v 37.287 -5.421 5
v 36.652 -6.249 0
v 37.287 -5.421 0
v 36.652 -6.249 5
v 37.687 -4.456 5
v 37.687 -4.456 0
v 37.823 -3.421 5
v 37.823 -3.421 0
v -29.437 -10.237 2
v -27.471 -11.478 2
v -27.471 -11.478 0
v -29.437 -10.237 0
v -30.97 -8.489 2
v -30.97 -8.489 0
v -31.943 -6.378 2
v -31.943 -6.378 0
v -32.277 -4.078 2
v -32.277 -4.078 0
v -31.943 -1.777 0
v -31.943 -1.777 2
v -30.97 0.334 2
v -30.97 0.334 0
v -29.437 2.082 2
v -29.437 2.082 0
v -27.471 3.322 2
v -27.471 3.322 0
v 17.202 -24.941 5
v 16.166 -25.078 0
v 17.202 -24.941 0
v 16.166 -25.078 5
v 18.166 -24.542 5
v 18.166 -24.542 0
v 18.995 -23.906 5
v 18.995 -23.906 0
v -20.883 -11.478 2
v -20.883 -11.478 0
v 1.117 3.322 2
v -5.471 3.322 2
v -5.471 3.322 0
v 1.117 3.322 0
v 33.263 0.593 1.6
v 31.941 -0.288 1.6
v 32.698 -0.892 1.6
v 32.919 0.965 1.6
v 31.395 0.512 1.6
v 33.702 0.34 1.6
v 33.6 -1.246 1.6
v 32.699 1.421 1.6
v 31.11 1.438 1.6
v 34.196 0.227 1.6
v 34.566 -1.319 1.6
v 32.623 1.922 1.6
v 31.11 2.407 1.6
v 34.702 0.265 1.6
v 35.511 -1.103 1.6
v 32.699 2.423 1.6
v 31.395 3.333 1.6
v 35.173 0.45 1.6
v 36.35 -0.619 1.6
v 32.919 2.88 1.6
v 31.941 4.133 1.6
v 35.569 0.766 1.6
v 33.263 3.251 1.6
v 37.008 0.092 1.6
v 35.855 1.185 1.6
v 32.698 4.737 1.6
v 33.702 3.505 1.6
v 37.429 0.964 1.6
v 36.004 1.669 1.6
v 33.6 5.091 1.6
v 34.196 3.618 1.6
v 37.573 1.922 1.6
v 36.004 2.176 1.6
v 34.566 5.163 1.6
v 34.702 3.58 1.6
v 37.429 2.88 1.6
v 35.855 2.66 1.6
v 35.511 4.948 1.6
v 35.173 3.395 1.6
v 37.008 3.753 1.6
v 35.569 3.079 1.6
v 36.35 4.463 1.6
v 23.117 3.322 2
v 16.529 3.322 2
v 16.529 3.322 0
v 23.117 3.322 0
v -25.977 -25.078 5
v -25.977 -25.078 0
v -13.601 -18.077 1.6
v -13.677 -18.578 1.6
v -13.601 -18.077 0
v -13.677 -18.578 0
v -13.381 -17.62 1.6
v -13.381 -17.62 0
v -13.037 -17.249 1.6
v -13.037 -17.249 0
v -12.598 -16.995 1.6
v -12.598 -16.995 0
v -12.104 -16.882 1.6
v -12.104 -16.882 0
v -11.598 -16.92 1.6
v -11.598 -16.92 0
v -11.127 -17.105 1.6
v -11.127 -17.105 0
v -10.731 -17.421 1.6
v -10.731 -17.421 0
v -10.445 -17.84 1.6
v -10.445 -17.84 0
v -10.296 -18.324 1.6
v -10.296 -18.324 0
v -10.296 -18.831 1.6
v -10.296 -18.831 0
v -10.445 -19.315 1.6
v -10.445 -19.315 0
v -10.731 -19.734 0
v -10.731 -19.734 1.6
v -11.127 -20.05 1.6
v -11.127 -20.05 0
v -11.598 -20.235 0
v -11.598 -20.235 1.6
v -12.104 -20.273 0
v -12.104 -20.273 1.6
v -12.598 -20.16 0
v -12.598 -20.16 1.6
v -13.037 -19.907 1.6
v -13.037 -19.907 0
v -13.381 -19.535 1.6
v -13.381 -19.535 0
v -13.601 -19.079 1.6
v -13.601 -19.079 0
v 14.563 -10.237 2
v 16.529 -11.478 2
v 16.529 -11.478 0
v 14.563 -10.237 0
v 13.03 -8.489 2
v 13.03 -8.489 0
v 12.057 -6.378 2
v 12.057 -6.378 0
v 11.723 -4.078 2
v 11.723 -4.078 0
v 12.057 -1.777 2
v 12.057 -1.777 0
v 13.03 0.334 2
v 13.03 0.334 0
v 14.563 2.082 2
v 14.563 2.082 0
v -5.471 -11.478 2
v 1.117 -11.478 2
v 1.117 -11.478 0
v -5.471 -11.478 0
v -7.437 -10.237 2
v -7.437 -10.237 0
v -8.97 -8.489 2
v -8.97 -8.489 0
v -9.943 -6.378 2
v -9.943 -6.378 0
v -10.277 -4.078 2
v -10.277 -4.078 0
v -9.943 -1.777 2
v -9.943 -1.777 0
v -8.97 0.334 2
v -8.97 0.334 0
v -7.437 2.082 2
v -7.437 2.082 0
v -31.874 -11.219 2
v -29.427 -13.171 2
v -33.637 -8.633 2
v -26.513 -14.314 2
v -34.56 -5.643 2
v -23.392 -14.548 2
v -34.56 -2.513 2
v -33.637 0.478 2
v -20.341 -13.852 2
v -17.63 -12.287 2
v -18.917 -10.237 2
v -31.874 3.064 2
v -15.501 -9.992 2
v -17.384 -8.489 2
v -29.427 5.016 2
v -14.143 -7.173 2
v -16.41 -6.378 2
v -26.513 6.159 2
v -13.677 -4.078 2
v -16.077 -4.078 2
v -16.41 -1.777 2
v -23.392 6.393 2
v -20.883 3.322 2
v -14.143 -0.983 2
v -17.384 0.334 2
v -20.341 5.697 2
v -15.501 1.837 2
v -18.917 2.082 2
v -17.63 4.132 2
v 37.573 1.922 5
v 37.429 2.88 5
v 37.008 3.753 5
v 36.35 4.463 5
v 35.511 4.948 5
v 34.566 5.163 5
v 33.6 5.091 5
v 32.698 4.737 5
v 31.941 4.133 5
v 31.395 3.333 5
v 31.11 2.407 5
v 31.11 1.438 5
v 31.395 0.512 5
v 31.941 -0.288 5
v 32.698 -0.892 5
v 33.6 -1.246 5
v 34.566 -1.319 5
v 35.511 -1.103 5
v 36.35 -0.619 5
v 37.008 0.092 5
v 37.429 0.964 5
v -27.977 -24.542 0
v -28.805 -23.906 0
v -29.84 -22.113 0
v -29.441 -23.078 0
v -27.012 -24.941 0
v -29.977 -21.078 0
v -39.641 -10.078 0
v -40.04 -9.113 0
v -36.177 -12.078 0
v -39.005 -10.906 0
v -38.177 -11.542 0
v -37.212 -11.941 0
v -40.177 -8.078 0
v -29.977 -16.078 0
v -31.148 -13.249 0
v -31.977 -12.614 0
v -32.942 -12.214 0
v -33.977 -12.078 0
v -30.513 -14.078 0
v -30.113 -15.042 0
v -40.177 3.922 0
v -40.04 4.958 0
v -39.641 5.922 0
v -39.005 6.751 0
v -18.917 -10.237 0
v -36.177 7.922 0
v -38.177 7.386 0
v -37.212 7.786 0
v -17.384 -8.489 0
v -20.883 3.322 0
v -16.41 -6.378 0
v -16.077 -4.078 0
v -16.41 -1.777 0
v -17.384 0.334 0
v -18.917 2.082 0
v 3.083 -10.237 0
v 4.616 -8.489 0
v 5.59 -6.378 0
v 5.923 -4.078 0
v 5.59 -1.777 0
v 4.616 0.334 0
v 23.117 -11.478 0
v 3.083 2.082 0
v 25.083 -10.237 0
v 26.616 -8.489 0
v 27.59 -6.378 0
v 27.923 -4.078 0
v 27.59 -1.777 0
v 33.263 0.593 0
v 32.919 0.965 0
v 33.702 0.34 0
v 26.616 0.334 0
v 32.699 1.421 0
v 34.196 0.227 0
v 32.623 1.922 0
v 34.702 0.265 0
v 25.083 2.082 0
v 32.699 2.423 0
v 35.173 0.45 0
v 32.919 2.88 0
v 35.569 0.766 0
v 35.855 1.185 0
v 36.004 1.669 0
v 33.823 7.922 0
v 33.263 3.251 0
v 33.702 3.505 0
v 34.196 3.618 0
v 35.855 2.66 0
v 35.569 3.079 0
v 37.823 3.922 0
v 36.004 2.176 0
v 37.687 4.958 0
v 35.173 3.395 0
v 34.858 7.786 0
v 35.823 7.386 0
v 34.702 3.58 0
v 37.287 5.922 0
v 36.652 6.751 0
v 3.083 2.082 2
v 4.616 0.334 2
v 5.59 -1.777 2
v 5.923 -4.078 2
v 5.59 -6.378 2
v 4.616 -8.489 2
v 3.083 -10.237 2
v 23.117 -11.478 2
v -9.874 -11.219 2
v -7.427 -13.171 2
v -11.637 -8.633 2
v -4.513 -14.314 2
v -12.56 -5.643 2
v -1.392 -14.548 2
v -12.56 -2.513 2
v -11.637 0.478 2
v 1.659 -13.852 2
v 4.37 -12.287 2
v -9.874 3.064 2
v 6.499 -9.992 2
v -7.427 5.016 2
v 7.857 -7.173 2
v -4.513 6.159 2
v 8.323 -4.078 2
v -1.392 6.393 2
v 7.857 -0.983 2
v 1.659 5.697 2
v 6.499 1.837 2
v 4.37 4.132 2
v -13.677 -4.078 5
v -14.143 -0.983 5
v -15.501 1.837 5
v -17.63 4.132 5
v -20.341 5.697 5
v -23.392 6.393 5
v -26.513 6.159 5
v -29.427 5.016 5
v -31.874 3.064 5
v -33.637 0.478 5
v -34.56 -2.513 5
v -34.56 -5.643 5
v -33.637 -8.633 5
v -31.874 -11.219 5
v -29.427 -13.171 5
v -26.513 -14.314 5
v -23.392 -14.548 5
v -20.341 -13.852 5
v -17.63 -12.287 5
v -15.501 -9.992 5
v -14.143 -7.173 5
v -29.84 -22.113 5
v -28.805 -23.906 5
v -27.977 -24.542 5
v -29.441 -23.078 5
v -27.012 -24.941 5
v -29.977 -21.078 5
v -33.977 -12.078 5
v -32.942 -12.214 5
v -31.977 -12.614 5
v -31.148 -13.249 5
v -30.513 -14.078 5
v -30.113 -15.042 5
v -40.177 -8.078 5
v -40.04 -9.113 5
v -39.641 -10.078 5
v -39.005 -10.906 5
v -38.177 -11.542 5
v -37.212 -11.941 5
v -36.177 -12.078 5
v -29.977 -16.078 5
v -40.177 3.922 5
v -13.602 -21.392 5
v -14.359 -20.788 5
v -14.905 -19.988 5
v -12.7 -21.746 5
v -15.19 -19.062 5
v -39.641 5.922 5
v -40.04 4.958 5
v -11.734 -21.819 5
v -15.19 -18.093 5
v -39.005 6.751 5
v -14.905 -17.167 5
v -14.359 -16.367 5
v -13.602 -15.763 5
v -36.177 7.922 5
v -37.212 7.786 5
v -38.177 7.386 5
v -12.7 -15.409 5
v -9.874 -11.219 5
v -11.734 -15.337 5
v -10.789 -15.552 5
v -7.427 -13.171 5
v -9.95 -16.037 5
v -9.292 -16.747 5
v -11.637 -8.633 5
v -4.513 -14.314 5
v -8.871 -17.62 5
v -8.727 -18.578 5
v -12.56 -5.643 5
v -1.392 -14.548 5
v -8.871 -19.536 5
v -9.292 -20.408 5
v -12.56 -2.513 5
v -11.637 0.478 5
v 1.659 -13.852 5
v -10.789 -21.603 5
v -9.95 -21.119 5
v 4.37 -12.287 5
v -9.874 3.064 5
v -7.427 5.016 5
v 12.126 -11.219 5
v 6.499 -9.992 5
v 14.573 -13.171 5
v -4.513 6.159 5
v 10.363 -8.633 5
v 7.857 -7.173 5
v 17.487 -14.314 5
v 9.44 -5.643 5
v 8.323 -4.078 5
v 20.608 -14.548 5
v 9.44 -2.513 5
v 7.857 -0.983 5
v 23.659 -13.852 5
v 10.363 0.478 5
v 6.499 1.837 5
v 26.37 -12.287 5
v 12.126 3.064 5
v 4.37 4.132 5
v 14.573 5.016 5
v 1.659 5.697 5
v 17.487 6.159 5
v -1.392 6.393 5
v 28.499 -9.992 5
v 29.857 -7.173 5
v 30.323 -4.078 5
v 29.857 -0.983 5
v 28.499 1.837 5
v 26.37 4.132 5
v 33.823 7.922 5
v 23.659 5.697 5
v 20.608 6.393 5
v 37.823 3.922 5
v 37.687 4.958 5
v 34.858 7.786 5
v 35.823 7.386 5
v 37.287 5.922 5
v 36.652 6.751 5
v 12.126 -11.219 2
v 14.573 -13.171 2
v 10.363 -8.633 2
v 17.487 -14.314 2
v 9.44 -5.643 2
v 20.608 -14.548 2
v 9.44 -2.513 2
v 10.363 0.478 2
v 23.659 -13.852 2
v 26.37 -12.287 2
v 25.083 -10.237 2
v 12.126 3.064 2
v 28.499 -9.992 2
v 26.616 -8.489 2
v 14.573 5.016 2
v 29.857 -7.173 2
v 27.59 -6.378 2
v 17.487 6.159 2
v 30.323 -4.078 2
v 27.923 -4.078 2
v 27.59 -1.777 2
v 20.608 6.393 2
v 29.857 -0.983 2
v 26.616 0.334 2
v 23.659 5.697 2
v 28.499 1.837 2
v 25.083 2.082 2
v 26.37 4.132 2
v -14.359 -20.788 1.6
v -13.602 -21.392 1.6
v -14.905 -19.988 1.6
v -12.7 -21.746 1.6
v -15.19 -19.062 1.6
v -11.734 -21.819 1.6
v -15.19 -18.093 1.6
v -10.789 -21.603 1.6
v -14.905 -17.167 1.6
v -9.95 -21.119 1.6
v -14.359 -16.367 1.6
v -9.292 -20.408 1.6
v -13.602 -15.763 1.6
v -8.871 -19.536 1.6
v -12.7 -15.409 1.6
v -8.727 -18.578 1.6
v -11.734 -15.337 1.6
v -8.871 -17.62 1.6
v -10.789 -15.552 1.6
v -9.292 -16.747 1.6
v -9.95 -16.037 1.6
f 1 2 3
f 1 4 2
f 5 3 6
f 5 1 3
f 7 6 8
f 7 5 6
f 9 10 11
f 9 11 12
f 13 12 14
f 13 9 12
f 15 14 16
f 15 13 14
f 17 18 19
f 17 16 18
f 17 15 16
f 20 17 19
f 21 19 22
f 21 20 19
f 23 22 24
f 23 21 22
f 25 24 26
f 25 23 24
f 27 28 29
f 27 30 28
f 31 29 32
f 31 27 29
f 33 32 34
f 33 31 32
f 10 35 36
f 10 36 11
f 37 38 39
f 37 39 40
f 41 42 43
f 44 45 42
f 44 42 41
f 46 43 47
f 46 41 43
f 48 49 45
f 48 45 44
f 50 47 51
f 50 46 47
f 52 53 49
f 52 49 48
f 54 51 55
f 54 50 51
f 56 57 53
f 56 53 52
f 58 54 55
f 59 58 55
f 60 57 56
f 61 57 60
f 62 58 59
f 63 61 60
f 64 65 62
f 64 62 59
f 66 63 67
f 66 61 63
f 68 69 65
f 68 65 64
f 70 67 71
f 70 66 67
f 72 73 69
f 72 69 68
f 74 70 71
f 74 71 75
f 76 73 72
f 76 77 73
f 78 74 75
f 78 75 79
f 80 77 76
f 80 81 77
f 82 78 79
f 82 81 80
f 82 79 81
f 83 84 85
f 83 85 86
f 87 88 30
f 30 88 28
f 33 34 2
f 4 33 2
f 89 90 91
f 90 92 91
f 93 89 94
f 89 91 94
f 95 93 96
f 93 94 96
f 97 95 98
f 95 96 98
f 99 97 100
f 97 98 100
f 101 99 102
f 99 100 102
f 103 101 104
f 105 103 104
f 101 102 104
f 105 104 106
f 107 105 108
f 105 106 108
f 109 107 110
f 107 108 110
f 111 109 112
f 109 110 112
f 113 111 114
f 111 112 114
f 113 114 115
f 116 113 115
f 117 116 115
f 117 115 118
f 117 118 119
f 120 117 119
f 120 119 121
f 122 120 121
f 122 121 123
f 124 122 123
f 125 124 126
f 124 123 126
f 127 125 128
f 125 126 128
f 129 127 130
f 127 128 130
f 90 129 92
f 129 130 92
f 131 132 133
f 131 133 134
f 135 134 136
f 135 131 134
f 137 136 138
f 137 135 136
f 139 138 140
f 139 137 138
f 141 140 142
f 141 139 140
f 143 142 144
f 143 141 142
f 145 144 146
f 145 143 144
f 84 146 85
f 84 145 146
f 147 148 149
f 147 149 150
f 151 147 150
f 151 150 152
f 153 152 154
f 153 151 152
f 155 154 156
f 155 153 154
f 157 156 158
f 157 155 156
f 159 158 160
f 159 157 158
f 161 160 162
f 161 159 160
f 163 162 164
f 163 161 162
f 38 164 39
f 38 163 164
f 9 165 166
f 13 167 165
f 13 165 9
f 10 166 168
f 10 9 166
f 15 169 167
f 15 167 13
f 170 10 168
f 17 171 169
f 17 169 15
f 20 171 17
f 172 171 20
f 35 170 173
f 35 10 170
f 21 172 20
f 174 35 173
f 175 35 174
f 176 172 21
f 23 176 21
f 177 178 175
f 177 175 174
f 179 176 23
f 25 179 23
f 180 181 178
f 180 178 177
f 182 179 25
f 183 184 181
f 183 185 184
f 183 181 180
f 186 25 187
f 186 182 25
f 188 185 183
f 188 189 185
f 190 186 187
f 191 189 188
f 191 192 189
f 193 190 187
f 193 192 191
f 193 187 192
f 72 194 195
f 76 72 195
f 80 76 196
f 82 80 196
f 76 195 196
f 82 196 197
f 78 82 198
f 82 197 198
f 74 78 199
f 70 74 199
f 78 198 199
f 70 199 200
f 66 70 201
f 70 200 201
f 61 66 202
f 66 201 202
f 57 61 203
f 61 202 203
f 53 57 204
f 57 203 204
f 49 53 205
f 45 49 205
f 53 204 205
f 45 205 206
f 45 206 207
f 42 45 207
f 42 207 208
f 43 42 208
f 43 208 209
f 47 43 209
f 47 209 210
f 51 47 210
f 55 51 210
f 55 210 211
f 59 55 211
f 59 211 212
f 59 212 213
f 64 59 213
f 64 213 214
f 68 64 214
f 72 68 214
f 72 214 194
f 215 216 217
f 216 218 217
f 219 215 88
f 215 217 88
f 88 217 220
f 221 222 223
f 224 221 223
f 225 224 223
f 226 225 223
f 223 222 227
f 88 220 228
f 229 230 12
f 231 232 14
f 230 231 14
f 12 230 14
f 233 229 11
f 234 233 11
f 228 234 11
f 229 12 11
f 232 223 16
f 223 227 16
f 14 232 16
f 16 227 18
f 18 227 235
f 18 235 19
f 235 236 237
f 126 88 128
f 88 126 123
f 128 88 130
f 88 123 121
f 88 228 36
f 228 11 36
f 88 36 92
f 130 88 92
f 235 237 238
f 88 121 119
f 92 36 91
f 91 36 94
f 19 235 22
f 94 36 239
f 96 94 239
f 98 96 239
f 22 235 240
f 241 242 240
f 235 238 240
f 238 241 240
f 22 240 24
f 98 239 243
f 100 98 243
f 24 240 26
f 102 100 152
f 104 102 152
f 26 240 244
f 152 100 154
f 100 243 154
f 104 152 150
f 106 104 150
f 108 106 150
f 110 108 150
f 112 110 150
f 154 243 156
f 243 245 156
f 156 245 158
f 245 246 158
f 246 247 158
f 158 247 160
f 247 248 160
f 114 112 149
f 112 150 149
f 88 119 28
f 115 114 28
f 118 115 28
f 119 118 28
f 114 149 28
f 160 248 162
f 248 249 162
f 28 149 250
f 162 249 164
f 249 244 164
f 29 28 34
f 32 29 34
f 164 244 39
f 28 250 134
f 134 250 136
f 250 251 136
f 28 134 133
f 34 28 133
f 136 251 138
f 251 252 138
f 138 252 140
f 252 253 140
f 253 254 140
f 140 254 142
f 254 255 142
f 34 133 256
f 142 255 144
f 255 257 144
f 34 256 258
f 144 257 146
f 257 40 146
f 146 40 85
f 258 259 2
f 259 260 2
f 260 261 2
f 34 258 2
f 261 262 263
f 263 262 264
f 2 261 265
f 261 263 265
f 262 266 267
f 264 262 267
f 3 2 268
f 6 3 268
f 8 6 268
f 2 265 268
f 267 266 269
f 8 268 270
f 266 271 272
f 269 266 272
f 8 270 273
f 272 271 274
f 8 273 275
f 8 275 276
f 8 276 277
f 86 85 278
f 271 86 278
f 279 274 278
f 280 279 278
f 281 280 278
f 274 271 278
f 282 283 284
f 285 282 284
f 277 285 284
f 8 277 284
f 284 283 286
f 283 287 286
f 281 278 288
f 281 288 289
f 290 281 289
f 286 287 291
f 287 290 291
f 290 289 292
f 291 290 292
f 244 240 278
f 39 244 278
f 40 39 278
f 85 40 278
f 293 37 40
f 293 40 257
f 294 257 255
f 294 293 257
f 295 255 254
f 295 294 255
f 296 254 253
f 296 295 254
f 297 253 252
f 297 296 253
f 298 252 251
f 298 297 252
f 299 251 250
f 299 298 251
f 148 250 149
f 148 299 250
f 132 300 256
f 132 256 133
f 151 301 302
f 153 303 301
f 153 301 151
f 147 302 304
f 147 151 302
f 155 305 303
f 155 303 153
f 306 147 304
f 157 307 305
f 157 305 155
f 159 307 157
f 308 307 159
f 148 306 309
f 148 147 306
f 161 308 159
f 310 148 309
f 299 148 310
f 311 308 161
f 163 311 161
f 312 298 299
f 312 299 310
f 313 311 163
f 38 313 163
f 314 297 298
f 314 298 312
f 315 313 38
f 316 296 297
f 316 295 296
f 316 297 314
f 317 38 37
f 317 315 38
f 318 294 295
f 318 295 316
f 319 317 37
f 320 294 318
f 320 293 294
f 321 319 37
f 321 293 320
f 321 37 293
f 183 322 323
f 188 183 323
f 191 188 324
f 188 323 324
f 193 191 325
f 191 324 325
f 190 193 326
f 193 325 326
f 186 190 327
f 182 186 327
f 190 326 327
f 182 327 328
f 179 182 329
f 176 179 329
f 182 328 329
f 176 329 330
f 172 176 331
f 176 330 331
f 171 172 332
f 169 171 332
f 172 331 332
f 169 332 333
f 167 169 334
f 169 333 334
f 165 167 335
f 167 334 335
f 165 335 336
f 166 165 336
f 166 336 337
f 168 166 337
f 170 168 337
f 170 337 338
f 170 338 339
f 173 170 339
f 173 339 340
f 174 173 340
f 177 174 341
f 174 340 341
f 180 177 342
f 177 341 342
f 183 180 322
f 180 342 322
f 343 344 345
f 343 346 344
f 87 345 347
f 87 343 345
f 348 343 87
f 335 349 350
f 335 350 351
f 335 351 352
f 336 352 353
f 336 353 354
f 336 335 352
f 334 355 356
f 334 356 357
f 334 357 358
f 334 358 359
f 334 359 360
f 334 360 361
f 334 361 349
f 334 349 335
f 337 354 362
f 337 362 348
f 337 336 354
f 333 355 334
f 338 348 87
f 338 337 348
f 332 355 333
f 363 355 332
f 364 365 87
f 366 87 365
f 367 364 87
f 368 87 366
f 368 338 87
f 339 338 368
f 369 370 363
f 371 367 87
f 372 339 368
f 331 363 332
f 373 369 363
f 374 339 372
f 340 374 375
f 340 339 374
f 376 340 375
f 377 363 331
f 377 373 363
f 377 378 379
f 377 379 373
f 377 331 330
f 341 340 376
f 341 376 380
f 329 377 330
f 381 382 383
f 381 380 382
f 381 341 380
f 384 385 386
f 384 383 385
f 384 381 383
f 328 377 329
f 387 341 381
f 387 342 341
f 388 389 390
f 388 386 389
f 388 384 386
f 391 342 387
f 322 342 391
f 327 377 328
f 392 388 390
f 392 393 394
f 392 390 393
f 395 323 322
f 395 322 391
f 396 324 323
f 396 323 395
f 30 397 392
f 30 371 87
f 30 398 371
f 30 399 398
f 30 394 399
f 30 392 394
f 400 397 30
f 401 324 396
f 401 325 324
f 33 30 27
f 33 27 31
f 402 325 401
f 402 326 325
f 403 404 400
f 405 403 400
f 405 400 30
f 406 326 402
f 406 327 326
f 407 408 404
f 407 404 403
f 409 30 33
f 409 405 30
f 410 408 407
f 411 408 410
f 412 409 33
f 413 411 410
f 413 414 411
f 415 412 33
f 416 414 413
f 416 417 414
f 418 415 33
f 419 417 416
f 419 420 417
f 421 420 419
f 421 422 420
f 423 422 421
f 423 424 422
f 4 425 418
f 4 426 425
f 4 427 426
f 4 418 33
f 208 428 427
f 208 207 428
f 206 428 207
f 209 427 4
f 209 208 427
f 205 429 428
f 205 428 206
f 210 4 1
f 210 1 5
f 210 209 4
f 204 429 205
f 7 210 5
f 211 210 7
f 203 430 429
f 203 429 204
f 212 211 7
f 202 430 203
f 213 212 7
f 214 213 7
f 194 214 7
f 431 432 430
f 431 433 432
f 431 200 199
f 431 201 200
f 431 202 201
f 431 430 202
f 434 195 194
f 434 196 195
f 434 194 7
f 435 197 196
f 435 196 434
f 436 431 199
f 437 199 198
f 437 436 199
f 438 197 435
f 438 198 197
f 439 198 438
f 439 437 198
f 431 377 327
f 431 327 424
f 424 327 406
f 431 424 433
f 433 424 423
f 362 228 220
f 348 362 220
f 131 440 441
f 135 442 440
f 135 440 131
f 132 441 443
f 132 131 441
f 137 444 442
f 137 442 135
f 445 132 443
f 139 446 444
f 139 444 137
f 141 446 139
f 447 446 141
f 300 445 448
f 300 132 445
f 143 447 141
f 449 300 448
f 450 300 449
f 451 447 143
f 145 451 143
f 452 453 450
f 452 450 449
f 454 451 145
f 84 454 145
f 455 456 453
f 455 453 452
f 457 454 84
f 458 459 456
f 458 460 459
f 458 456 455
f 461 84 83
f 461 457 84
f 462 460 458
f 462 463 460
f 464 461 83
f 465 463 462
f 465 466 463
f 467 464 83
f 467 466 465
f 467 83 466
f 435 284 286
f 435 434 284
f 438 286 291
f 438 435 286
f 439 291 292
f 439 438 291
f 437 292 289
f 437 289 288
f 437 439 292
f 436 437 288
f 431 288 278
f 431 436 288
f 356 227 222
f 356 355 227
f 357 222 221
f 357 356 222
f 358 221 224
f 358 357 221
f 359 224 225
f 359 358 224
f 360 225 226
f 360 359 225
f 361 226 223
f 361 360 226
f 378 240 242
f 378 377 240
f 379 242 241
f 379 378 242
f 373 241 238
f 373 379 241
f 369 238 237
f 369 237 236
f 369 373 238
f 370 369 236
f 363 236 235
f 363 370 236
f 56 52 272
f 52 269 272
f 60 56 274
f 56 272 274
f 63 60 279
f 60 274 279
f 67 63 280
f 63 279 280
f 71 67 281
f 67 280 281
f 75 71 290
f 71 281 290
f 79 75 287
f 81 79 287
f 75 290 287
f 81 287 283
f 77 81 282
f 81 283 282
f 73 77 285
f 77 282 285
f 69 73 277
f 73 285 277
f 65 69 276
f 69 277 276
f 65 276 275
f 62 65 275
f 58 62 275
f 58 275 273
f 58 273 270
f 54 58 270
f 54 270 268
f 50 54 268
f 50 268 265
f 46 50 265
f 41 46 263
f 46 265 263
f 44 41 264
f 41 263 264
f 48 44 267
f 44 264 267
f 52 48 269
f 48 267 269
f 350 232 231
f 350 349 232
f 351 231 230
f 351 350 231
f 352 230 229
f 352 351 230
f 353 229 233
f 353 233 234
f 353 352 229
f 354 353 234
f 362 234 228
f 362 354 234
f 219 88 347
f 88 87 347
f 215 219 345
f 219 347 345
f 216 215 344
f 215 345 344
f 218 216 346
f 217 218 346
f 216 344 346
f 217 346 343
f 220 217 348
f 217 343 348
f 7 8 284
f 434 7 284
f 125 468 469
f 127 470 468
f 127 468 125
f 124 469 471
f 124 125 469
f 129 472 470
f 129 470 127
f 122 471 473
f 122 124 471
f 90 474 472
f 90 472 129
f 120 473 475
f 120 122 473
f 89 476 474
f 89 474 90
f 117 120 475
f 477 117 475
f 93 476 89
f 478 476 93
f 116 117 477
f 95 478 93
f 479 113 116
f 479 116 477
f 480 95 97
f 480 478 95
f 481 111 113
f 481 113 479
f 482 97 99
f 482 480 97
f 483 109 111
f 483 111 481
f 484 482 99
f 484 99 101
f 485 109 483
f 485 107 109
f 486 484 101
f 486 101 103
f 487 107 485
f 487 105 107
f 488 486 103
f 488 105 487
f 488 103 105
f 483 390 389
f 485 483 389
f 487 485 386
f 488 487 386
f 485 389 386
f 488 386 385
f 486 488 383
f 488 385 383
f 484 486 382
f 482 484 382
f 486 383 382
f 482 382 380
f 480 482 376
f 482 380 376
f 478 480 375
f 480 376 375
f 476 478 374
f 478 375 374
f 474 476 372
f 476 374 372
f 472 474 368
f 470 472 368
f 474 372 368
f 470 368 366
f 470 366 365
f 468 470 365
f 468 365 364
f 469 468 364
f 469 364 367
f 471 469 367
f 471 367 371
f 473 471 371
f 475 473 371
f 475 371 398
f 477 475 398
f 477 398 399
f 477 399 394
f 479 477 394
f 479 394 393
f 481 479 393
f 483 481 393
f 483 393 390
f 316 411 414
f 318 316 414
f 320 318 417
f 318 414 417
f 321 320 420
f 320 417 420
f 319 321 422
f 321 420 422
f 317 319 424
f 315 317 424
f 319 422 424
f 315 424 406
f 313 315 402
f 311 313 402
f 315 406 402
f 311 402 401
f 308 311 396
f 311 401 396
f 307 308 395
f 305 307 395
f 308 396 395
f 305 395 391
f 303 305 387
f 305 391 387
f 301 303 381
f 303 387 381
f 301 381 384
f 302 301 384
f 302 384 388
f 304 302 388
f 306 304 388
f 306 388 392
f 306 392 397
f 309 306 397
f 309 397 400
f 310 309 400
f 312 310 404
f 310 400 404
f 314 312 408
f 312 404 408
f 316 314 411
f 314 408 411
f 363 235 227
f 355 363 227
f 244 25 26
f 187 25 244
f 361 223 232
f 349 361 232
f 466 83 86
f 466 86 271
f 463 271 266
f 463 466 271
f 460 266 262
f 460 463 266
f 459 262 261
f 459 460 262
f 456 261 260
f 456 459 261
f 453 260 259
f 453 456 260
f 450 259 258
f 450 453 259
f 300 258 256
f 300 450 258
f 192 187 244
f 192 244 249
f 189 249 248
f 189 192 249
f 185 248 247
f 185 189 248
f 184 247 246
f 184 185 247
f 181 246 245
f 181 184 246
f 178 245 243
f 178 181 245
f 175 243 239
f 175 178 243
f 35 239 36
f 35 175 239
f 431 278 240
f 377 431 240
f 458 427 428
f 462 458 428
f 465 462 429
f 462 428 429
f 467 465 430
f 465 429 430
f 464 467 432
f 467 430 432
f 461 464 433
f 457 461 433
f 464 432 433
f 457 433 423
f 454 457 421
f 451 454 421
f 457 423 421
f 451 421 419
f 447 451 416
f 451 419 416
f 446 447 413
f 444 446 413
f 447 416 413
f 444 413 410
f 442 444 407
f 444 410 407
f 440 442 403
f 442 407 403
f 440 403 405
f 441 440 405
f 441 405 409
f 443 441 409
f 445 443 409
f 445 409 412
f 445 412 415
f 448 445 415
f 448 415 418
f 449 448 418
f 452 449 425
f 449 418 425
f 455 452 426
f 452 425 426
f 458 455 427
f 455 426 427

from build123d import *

# Parameters (mm, degrees)
BOSS_EXTRU_1_DEPTH                                 = 5
CONG_1_R                                           = 4
ENL_V_MAT_EXTRU_1_DEPTH                            = 10
ESQUISSE5_R                                        = 10.5
ENL_V_MAT_EXTRU_3_DEPTH                            = 3
CHAMBRAGE_POUR_VIS_T_TE_HEXAGONALE_M31_D           = 3.4
CHAMBRAGE_POUR_VIS_T_TE_HEXAGONALE_M31_CBORE_D     = 6.5
CHAMBRAGE_POUR_VIS_T_TE_HEXAGONALE_M31_CBORE_DEPTH = 3.4


with BuildPart() as part:
    # Esquisse1 → Boss.-Extru.1 (new body)
    with BuildSketch(Plane.XY):
        Polygon((-29.976777828, -25.077617952), (17.823222172, -25.077617952), (37.823222172, -5.077617952), (37.823222172, 7.922382048), (-30.176777828, 7.922382048), (-40.176777828, 7.922382048), (-40.176777828, -12.077617952), (-29.976777828, -12.077617952), align=None)
    extrude(amount=BOSS_EXTRU_1_DEPTH)

    # Congé1
    cong_1_edges = [part.edges().sort_by_distance(p)[0] for p in [
        (-29.976777828, -12.077617952, 2.5),
        (-40.176777828, -12.077617952, 2.5),
        (-40.176777828, 7.922382048, 2.5),
        (37.823222172, 7.922382048, 2.5),
        (37.823222172, -5.077617952, 2.5),
        (17.823222172, -25.077617952, 2.5),
        (-29.976777828, -25.077617952, 2.5),
    ]]
    fillet(cong_1_edges, radius=CONG_1_R)

    # Esquisse2 → Enlèv. mat.-Extru.1 (cut)
    with BuildSketch(Plane.XY.offset(5)):
        with BuildLine():
            Line((-5.470711646, 3.322382048), (1.117155991, 3.322382048))
            ThreePointArc((1.117155991, 3.322382048), (5.923222172, -4.077617952), (1.117155991, -11.477617952))
            Line((1.117155991, -11.477617952), (-5.470711646, -11.477617952))
            ThreePointArc((-5.470711646, -11.477617952), (-10.276777828, -4.077617952), (-5.470711646, 3.322382048))
        make_face()
        with BuildLine():
            Line((16.529288354, 3.322382048), (23.117155991, 3.322382048))
            ThreePointArc((23.117155991, 3.322382048), (27.923222172, -4.077617952), (23.117155991, -11.477617952))
            Line((23.117155991, -11.477617952), (16.529288354, -11.477617952))
            ThreePointArc((16.529288354, -11.477617952), (11.723222172, -4.077617952), (16.529288354, 3.322382048))
        make_face()
        with BuildLine():
            Line((-27.470711646, 3.322382048), (-20.882844009, 3.322382048))
            ThreePointArc((-20.882844009, 3.322382048), (-16.076777828, -4.077617952), (-20.882844009, -11.477617952))
            Line((-20.882844009, -11.477617952), (-27.470711646, -11.477617952))
            ThreePointArc((-27.470711646, -11.477617952), (-32.276777828, -4.077617952), (-27.470711646, 3.322382048))
        make_face()
    extrude(amount=-ENL_V_MAT_EXTRU_1_DEPTH, mode=Mode.SUBTRACT)

    # Esquisse5 → Enlèv. mat.-Extru.3 (cut)
    with BuildSketch(Plane.XY.offset(5)):
        with Locations((19.823222172, -4.077617952)):
            Circle(ESQUISSE5_R)
        with Locations((-2.176777828, -4.077617952)):
            Circle(ESQUISSE5_R)
        with Locations((-24.176777828, -4.077617952)):
            Circle(ESQUISSE5_R)
    extrude(amount=-ENL_V_MAT_EXTRU_3_DEPTH, mode=Mode.SUBTRACT)

    # Chambrage pour vis à tête hexagonale M31 (through all)
    with Locations(Plane.XY.offset(5)):
        with Locations((34.323222172, 1.922382048), (-11.976777828, -18.577617952)):
            CounterBoreHole(CHAMBRAGE_POUR_VIS_T_TE_HEXAGONALE_M31_D / 2, CHAMBRAGE_POUR_VIS_T_TE_HEXAGONALE_M31_CBORE_D / 2, CHAMBRAGE_POUR_VIS_T_TE_HEXAGONALE_M31_CBORE_DEPTH)


solid = part.part
